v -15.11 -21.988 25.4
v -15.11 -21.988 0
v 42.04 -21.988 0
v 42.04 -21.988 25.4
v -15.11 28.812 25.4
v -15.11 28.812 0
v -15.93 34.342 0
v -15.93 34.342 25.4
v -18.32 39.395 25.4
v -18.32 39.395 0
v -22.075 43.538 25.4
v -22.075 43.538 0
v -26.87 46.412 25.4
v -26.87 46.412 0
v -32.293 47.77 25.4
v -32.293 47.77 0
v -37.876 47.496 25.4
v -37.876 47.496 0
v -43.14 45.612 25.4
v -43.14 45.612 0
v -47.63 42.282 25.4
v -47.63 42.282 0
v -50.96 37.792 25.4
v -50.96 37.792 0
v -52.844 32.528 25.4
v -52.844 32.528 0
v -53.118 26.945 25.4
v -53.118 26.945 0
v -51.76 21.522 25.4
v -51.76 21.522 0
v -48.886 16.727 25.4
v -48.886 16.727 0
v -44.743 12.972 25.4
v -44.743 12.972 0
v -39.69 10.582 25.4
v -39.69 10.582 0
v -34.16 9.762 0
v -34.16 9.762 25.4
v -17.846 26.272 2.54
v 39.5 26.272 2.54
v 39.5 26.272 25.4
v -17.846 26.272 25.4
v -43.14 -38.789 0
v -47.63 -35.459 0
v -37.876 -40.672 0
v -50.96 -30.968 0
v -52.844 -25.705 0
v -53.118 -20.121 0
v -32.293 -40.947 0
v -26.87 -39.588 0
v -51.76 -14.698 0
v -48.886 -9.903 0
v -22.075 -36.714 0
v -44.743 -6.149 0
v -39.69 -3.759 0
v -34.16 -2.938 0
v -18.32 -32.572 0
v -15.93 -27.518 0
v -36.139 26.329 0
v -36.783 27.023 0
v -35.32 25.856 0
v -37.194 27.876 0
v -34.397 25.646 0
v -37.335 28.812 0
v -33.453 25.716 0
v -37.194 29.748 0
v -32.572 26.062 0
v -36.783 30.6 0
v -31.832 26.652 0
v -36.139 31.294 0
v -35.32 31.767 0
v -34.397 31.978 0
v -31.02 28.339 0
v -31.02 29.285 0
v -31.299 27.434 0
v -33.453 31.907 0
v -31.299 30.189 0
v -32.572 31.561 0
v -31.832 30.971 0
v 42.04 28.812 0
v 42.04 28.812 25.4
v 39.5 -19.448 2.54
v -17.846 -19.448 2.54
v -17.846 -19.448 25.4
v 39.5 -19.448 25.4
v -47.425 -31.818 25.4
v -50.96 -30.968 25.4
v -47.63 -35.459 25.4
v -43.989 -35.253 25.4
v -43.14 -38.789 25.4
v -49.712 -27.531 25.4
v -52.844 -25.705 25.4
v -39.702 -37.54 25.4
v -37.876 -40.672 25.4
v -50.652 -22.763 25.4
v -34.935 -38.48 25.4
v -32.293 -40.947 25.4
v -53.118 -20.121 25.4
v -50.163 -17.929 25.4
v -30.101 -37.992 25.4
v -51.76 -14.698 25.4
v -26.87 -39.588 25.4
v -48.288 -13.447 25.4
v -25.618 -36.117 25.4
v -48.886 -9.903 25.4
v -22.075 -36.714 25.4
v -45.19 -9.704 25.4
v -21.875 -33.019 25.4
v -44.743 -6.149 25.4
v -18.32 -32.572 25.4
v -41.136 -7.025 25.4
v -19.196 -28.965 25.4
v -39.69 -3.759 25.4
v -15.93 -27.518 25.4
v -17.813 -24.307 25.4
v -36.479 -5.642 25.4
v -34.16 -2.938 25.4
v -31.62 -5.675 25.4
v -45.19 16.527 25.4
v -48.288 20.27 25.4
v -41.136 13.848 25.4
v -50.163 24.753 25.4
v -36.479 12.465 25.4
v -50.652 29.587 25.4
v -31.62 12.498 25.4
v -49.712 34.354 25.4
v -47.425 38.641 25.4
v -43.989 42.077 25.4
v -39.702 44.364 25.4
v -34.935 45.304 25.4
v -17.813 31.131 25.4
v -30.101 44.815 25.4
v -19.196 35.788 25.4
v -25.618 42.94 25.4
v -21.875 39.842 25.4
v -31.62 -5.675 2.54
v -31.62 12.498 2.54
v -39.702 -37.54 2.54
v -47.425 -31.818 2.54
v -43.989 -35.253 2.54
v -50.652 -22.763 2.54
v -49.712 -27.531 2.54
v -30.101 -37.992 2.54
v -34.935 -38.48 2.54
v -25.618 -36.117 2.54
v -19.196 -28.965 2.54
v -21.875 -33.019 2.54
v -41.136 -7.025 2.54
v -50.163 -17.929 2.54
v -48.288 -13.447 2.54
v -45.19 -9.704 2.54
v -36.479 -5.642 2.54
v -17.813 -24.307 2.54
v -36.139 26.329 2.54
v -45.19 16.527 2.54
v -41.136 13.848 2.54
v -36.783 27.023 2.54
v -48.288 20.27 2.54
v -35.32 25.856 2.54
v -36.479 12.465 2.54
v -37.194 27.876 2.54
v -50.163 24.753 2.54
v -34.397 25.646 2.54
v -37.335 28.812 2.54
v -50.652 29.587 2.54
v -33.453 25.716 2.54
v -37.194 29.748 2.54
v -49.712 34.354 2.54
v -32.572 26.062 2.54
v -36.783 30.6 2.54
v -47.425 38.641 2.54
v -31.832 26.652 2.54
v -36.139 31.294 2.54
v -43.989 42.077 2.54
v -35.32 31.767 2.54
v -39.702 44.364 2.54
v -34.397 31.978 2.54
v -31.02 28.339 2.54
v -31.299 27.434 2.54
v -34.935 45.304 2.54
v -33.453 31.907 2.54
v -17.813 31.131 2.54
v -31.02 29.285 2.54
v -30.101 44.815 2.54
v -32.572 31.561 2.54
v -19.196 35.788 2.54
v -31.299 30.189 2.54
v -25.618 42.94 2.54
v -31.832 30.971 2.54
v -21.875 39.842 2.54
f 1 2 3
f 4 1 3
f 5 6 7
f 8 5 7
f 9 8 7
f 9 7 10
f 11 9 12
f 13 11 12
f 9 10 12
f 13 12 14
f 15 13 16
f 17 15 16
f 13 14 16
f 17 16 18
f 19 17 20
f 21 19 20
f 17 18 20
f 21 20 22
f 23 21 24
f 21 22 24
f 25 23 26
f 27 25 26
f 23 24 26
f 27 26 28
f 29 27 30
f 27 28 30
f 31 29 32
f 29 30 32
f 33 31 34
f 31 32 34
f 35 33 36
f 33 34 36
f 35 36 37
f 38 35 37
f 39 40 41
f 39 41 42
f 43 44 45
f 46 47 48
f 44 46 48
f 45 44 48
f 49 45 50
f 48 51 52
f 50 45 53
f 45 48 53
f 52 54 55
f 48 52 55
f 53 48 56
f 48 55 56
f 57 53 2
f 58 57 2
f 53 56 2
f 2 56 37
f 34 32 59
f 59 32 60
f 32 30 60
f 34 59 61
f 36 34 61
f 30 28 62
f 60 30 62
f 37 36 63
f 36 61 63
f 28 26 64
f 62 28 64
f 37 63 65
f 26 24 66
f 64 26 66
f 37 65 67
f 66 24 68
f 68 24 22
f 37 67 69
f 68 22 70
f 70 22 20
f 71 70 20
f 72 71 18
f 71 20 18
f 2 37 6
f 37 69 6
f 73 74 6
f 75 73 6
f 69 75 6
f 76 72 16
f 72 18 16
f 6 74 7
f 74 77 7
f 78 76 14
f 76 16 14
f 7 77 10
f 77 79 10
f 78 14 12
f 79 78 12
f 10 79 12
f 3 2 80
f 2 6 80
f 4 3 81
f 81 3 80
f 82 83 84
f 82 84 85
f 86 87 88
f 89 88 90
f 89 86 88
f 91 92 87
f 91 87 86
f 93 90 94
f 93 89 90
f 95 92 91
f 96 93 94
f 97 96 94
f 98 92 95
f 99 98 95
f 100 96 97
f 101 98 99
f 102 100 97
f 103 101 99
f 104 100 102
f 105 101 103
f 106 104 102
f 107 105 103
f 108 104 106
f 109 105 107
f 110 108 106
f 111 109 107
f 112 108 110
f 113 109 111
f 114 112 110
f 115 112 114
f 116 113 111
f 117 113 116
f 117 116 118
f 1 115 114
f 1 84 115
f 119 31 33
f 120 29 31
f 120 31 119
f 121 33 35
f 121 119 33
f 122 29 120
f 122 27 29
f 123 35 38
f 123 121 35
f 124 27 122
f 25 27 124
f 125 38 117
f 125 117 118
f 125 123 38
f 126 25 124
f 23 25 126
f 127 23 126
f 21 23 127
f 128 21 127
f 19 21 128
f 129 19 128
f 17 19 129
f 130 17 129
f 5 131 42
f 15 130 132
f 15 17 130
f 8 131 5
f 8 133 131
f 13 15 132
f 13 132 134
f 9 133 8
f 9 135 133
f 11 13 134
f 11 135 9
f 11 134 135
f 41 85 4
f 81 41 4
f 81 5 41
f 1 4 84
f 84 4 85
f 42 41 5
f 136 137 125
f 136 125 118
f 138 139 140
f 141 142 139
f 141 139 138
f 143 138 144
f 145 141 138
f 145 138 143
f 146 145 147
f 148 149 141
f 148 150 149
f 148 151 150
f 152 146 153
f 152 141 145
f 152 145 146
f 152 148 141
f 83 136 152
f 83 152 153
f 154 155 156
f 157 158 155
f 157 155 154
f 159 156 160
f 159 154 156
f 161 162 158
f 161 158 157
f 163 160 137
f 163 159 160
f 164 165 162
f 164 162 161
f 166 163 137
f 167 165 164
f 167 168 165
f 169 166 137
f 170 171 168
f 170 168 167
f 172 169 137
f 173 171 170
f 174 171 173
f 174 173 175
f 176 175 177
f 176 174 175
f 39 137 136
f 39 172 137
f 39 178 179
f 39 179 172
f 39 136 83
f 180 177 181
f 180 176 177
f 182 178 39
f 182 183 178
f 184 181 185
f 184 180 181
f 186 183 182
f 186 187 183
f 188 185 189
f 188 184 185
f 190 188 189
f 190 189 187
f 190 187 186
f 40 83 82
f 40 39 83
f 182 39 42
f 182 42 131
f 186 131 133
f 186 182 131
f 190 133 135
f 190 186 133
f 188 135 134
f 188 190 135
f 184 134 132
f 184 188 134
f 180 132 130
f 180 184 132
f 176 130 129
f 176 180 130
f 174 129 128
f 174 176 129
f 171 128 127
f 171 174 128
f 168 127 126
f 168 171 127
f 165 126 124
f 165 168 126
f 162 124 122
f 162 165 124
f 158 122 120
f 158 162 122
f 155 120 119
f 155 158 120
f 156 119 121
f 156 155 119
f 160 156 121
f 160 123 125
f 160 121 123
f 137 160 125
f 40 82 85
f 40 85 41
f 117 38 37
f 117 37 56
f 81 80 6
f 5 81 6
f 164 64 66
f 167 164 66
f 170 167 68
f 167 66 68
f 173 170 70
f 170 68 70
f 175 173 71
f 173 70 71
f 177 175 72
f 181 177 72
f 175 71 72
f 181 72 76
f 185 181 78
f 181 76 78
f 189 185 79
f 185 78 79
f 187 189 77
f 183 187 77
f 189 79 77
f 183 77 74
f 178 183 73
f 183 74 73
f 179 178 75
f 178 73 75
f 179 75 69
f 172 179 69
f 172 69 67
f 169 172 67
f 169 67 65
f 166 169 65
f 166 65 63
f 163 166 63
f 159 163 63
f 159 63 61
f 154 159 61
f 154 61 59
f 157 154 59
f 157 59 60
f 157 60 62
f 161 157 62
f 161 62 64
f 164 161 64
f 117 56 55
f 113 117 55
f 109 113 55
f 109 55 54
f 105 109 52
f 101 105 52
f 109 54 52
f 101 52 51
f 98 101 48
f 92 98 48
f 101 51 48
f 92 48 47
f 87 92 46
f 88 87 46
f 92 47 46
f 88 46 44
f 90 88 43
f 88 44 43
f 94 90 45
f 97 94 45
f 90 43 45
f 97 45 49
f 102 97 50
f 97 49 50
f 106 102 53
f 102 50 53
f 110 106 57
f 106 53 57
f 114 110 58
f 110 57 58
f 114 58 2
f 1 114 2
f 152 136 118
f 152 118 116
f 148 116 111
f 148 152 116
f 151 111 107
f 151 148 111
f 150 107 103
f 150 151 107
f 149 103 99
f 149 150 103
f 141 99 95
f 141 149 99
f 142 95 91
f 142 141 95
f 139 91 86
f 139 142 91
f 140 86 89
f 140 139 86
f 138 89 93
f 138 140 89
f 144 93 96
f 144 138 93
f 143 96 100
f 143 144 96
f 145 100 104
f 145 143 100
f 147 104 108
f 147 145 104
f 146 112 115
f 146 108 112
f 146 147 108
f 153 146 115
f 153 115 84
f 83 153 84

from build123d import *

# Parameters (mm, degrees)
F1_DEPTH = 25.4
F2_T     = -2.54
F4_D     = 6.35


with BuildPart() as f1:
    # F0 (on Top) → F1 (new body)
    with BuildSketch(Plane.XY):
        with BuildLine():
            Line((42.0402561671, 28.8117545512), (-15.1097438329, 28.8117545512))
            ThreePointArc((-15.1097438329, 28.8117545512), (-20.6893596513, 15.3413703696), (-34.1597438329, 9.7617545512))
            Line((-34.1597438329, 9.7617545512), (-34.1597438329, -2.9382454488))
            ThreePointArc((-34.1597438329, -2.9382454488), (-20.6893596513, -8.5178612672), (-15.1097438329, -21.9882454488))
            Line((-15.1097438329, -21.9882454488), (42.0402561671, -21.9882454488))
            Line((42.0402561671, -21.9882454488), (42.0402561671, 28.8117545512))
        make_face()
        with BuildLine():
            ThreePointArc((-15.1097438329, -21.9882454488), (-20.6893596513, -8.5178612672), (-34.1597438329, -2.9382454488))
            Line((-34.1597438329, -2.9382454488), (-34.1597438329, -21.9882454488))
            Line((-34.1597438329, -21.9882454488), (-15.1097438329, -21.9882454488))
        make_face()
        with BuildLine():
            Line((-34.1597438329, -21.9882454488), (-34.1597438329, -2.9382454488))
            ThreePointArc((-34.1597438329, -2.9382454488), (-47.6301280145, -35.4586296304), (-15.1097438329, -21.9882454488))
            Line((-15.1097438329, -21.9882454488), (-34.1597438329, -21.9882454488))
        make_face()
        with BuildLine():
            Line((-34.1597438329, 9.7617545512), (-34.1597438329, 28.8117545512))
            Line((-34.1597438329, 28.8117545512), (-15.1097438329, 28.8117545512))
            ThreePointArc((-15.1097438329, 28.8117545512), (-47.6301280145, 42.2821387328), (-34.1597438329, 9.7617545512))
        make_face()
        with BuildLine():
            Line((-15.1097438329, 28.8117545512), (-34.1597438329, 28.8117545512))
            Line((-34.1597438329, 28.8117545512), (-34.1597438329, 9.7617545512))
            ThreePointArc((-34.1597438329, 9.7617545512), (-20.6893596513, 15.3413703696), (-15.1097438329, 28.8117545512))
        make_face()
    extrude(amount=F1_DEPTH)

    # F2
    f2_openings = [f1.faces().sort_by_distance(p)[0] for p in [
        (-8.559993, 3.411755, 25.4),
    ]]
    offset(amount=F2_T, openings=f2_openings, kind=Kind.INTERSECTION)

    # F4 (through all)
    with Locations(Plane.XY.offset(2.54)):
        with Locations((-34.1597438329, 28.8117545512)):
            Hole(F4_D / 2)


solid = f1.part
